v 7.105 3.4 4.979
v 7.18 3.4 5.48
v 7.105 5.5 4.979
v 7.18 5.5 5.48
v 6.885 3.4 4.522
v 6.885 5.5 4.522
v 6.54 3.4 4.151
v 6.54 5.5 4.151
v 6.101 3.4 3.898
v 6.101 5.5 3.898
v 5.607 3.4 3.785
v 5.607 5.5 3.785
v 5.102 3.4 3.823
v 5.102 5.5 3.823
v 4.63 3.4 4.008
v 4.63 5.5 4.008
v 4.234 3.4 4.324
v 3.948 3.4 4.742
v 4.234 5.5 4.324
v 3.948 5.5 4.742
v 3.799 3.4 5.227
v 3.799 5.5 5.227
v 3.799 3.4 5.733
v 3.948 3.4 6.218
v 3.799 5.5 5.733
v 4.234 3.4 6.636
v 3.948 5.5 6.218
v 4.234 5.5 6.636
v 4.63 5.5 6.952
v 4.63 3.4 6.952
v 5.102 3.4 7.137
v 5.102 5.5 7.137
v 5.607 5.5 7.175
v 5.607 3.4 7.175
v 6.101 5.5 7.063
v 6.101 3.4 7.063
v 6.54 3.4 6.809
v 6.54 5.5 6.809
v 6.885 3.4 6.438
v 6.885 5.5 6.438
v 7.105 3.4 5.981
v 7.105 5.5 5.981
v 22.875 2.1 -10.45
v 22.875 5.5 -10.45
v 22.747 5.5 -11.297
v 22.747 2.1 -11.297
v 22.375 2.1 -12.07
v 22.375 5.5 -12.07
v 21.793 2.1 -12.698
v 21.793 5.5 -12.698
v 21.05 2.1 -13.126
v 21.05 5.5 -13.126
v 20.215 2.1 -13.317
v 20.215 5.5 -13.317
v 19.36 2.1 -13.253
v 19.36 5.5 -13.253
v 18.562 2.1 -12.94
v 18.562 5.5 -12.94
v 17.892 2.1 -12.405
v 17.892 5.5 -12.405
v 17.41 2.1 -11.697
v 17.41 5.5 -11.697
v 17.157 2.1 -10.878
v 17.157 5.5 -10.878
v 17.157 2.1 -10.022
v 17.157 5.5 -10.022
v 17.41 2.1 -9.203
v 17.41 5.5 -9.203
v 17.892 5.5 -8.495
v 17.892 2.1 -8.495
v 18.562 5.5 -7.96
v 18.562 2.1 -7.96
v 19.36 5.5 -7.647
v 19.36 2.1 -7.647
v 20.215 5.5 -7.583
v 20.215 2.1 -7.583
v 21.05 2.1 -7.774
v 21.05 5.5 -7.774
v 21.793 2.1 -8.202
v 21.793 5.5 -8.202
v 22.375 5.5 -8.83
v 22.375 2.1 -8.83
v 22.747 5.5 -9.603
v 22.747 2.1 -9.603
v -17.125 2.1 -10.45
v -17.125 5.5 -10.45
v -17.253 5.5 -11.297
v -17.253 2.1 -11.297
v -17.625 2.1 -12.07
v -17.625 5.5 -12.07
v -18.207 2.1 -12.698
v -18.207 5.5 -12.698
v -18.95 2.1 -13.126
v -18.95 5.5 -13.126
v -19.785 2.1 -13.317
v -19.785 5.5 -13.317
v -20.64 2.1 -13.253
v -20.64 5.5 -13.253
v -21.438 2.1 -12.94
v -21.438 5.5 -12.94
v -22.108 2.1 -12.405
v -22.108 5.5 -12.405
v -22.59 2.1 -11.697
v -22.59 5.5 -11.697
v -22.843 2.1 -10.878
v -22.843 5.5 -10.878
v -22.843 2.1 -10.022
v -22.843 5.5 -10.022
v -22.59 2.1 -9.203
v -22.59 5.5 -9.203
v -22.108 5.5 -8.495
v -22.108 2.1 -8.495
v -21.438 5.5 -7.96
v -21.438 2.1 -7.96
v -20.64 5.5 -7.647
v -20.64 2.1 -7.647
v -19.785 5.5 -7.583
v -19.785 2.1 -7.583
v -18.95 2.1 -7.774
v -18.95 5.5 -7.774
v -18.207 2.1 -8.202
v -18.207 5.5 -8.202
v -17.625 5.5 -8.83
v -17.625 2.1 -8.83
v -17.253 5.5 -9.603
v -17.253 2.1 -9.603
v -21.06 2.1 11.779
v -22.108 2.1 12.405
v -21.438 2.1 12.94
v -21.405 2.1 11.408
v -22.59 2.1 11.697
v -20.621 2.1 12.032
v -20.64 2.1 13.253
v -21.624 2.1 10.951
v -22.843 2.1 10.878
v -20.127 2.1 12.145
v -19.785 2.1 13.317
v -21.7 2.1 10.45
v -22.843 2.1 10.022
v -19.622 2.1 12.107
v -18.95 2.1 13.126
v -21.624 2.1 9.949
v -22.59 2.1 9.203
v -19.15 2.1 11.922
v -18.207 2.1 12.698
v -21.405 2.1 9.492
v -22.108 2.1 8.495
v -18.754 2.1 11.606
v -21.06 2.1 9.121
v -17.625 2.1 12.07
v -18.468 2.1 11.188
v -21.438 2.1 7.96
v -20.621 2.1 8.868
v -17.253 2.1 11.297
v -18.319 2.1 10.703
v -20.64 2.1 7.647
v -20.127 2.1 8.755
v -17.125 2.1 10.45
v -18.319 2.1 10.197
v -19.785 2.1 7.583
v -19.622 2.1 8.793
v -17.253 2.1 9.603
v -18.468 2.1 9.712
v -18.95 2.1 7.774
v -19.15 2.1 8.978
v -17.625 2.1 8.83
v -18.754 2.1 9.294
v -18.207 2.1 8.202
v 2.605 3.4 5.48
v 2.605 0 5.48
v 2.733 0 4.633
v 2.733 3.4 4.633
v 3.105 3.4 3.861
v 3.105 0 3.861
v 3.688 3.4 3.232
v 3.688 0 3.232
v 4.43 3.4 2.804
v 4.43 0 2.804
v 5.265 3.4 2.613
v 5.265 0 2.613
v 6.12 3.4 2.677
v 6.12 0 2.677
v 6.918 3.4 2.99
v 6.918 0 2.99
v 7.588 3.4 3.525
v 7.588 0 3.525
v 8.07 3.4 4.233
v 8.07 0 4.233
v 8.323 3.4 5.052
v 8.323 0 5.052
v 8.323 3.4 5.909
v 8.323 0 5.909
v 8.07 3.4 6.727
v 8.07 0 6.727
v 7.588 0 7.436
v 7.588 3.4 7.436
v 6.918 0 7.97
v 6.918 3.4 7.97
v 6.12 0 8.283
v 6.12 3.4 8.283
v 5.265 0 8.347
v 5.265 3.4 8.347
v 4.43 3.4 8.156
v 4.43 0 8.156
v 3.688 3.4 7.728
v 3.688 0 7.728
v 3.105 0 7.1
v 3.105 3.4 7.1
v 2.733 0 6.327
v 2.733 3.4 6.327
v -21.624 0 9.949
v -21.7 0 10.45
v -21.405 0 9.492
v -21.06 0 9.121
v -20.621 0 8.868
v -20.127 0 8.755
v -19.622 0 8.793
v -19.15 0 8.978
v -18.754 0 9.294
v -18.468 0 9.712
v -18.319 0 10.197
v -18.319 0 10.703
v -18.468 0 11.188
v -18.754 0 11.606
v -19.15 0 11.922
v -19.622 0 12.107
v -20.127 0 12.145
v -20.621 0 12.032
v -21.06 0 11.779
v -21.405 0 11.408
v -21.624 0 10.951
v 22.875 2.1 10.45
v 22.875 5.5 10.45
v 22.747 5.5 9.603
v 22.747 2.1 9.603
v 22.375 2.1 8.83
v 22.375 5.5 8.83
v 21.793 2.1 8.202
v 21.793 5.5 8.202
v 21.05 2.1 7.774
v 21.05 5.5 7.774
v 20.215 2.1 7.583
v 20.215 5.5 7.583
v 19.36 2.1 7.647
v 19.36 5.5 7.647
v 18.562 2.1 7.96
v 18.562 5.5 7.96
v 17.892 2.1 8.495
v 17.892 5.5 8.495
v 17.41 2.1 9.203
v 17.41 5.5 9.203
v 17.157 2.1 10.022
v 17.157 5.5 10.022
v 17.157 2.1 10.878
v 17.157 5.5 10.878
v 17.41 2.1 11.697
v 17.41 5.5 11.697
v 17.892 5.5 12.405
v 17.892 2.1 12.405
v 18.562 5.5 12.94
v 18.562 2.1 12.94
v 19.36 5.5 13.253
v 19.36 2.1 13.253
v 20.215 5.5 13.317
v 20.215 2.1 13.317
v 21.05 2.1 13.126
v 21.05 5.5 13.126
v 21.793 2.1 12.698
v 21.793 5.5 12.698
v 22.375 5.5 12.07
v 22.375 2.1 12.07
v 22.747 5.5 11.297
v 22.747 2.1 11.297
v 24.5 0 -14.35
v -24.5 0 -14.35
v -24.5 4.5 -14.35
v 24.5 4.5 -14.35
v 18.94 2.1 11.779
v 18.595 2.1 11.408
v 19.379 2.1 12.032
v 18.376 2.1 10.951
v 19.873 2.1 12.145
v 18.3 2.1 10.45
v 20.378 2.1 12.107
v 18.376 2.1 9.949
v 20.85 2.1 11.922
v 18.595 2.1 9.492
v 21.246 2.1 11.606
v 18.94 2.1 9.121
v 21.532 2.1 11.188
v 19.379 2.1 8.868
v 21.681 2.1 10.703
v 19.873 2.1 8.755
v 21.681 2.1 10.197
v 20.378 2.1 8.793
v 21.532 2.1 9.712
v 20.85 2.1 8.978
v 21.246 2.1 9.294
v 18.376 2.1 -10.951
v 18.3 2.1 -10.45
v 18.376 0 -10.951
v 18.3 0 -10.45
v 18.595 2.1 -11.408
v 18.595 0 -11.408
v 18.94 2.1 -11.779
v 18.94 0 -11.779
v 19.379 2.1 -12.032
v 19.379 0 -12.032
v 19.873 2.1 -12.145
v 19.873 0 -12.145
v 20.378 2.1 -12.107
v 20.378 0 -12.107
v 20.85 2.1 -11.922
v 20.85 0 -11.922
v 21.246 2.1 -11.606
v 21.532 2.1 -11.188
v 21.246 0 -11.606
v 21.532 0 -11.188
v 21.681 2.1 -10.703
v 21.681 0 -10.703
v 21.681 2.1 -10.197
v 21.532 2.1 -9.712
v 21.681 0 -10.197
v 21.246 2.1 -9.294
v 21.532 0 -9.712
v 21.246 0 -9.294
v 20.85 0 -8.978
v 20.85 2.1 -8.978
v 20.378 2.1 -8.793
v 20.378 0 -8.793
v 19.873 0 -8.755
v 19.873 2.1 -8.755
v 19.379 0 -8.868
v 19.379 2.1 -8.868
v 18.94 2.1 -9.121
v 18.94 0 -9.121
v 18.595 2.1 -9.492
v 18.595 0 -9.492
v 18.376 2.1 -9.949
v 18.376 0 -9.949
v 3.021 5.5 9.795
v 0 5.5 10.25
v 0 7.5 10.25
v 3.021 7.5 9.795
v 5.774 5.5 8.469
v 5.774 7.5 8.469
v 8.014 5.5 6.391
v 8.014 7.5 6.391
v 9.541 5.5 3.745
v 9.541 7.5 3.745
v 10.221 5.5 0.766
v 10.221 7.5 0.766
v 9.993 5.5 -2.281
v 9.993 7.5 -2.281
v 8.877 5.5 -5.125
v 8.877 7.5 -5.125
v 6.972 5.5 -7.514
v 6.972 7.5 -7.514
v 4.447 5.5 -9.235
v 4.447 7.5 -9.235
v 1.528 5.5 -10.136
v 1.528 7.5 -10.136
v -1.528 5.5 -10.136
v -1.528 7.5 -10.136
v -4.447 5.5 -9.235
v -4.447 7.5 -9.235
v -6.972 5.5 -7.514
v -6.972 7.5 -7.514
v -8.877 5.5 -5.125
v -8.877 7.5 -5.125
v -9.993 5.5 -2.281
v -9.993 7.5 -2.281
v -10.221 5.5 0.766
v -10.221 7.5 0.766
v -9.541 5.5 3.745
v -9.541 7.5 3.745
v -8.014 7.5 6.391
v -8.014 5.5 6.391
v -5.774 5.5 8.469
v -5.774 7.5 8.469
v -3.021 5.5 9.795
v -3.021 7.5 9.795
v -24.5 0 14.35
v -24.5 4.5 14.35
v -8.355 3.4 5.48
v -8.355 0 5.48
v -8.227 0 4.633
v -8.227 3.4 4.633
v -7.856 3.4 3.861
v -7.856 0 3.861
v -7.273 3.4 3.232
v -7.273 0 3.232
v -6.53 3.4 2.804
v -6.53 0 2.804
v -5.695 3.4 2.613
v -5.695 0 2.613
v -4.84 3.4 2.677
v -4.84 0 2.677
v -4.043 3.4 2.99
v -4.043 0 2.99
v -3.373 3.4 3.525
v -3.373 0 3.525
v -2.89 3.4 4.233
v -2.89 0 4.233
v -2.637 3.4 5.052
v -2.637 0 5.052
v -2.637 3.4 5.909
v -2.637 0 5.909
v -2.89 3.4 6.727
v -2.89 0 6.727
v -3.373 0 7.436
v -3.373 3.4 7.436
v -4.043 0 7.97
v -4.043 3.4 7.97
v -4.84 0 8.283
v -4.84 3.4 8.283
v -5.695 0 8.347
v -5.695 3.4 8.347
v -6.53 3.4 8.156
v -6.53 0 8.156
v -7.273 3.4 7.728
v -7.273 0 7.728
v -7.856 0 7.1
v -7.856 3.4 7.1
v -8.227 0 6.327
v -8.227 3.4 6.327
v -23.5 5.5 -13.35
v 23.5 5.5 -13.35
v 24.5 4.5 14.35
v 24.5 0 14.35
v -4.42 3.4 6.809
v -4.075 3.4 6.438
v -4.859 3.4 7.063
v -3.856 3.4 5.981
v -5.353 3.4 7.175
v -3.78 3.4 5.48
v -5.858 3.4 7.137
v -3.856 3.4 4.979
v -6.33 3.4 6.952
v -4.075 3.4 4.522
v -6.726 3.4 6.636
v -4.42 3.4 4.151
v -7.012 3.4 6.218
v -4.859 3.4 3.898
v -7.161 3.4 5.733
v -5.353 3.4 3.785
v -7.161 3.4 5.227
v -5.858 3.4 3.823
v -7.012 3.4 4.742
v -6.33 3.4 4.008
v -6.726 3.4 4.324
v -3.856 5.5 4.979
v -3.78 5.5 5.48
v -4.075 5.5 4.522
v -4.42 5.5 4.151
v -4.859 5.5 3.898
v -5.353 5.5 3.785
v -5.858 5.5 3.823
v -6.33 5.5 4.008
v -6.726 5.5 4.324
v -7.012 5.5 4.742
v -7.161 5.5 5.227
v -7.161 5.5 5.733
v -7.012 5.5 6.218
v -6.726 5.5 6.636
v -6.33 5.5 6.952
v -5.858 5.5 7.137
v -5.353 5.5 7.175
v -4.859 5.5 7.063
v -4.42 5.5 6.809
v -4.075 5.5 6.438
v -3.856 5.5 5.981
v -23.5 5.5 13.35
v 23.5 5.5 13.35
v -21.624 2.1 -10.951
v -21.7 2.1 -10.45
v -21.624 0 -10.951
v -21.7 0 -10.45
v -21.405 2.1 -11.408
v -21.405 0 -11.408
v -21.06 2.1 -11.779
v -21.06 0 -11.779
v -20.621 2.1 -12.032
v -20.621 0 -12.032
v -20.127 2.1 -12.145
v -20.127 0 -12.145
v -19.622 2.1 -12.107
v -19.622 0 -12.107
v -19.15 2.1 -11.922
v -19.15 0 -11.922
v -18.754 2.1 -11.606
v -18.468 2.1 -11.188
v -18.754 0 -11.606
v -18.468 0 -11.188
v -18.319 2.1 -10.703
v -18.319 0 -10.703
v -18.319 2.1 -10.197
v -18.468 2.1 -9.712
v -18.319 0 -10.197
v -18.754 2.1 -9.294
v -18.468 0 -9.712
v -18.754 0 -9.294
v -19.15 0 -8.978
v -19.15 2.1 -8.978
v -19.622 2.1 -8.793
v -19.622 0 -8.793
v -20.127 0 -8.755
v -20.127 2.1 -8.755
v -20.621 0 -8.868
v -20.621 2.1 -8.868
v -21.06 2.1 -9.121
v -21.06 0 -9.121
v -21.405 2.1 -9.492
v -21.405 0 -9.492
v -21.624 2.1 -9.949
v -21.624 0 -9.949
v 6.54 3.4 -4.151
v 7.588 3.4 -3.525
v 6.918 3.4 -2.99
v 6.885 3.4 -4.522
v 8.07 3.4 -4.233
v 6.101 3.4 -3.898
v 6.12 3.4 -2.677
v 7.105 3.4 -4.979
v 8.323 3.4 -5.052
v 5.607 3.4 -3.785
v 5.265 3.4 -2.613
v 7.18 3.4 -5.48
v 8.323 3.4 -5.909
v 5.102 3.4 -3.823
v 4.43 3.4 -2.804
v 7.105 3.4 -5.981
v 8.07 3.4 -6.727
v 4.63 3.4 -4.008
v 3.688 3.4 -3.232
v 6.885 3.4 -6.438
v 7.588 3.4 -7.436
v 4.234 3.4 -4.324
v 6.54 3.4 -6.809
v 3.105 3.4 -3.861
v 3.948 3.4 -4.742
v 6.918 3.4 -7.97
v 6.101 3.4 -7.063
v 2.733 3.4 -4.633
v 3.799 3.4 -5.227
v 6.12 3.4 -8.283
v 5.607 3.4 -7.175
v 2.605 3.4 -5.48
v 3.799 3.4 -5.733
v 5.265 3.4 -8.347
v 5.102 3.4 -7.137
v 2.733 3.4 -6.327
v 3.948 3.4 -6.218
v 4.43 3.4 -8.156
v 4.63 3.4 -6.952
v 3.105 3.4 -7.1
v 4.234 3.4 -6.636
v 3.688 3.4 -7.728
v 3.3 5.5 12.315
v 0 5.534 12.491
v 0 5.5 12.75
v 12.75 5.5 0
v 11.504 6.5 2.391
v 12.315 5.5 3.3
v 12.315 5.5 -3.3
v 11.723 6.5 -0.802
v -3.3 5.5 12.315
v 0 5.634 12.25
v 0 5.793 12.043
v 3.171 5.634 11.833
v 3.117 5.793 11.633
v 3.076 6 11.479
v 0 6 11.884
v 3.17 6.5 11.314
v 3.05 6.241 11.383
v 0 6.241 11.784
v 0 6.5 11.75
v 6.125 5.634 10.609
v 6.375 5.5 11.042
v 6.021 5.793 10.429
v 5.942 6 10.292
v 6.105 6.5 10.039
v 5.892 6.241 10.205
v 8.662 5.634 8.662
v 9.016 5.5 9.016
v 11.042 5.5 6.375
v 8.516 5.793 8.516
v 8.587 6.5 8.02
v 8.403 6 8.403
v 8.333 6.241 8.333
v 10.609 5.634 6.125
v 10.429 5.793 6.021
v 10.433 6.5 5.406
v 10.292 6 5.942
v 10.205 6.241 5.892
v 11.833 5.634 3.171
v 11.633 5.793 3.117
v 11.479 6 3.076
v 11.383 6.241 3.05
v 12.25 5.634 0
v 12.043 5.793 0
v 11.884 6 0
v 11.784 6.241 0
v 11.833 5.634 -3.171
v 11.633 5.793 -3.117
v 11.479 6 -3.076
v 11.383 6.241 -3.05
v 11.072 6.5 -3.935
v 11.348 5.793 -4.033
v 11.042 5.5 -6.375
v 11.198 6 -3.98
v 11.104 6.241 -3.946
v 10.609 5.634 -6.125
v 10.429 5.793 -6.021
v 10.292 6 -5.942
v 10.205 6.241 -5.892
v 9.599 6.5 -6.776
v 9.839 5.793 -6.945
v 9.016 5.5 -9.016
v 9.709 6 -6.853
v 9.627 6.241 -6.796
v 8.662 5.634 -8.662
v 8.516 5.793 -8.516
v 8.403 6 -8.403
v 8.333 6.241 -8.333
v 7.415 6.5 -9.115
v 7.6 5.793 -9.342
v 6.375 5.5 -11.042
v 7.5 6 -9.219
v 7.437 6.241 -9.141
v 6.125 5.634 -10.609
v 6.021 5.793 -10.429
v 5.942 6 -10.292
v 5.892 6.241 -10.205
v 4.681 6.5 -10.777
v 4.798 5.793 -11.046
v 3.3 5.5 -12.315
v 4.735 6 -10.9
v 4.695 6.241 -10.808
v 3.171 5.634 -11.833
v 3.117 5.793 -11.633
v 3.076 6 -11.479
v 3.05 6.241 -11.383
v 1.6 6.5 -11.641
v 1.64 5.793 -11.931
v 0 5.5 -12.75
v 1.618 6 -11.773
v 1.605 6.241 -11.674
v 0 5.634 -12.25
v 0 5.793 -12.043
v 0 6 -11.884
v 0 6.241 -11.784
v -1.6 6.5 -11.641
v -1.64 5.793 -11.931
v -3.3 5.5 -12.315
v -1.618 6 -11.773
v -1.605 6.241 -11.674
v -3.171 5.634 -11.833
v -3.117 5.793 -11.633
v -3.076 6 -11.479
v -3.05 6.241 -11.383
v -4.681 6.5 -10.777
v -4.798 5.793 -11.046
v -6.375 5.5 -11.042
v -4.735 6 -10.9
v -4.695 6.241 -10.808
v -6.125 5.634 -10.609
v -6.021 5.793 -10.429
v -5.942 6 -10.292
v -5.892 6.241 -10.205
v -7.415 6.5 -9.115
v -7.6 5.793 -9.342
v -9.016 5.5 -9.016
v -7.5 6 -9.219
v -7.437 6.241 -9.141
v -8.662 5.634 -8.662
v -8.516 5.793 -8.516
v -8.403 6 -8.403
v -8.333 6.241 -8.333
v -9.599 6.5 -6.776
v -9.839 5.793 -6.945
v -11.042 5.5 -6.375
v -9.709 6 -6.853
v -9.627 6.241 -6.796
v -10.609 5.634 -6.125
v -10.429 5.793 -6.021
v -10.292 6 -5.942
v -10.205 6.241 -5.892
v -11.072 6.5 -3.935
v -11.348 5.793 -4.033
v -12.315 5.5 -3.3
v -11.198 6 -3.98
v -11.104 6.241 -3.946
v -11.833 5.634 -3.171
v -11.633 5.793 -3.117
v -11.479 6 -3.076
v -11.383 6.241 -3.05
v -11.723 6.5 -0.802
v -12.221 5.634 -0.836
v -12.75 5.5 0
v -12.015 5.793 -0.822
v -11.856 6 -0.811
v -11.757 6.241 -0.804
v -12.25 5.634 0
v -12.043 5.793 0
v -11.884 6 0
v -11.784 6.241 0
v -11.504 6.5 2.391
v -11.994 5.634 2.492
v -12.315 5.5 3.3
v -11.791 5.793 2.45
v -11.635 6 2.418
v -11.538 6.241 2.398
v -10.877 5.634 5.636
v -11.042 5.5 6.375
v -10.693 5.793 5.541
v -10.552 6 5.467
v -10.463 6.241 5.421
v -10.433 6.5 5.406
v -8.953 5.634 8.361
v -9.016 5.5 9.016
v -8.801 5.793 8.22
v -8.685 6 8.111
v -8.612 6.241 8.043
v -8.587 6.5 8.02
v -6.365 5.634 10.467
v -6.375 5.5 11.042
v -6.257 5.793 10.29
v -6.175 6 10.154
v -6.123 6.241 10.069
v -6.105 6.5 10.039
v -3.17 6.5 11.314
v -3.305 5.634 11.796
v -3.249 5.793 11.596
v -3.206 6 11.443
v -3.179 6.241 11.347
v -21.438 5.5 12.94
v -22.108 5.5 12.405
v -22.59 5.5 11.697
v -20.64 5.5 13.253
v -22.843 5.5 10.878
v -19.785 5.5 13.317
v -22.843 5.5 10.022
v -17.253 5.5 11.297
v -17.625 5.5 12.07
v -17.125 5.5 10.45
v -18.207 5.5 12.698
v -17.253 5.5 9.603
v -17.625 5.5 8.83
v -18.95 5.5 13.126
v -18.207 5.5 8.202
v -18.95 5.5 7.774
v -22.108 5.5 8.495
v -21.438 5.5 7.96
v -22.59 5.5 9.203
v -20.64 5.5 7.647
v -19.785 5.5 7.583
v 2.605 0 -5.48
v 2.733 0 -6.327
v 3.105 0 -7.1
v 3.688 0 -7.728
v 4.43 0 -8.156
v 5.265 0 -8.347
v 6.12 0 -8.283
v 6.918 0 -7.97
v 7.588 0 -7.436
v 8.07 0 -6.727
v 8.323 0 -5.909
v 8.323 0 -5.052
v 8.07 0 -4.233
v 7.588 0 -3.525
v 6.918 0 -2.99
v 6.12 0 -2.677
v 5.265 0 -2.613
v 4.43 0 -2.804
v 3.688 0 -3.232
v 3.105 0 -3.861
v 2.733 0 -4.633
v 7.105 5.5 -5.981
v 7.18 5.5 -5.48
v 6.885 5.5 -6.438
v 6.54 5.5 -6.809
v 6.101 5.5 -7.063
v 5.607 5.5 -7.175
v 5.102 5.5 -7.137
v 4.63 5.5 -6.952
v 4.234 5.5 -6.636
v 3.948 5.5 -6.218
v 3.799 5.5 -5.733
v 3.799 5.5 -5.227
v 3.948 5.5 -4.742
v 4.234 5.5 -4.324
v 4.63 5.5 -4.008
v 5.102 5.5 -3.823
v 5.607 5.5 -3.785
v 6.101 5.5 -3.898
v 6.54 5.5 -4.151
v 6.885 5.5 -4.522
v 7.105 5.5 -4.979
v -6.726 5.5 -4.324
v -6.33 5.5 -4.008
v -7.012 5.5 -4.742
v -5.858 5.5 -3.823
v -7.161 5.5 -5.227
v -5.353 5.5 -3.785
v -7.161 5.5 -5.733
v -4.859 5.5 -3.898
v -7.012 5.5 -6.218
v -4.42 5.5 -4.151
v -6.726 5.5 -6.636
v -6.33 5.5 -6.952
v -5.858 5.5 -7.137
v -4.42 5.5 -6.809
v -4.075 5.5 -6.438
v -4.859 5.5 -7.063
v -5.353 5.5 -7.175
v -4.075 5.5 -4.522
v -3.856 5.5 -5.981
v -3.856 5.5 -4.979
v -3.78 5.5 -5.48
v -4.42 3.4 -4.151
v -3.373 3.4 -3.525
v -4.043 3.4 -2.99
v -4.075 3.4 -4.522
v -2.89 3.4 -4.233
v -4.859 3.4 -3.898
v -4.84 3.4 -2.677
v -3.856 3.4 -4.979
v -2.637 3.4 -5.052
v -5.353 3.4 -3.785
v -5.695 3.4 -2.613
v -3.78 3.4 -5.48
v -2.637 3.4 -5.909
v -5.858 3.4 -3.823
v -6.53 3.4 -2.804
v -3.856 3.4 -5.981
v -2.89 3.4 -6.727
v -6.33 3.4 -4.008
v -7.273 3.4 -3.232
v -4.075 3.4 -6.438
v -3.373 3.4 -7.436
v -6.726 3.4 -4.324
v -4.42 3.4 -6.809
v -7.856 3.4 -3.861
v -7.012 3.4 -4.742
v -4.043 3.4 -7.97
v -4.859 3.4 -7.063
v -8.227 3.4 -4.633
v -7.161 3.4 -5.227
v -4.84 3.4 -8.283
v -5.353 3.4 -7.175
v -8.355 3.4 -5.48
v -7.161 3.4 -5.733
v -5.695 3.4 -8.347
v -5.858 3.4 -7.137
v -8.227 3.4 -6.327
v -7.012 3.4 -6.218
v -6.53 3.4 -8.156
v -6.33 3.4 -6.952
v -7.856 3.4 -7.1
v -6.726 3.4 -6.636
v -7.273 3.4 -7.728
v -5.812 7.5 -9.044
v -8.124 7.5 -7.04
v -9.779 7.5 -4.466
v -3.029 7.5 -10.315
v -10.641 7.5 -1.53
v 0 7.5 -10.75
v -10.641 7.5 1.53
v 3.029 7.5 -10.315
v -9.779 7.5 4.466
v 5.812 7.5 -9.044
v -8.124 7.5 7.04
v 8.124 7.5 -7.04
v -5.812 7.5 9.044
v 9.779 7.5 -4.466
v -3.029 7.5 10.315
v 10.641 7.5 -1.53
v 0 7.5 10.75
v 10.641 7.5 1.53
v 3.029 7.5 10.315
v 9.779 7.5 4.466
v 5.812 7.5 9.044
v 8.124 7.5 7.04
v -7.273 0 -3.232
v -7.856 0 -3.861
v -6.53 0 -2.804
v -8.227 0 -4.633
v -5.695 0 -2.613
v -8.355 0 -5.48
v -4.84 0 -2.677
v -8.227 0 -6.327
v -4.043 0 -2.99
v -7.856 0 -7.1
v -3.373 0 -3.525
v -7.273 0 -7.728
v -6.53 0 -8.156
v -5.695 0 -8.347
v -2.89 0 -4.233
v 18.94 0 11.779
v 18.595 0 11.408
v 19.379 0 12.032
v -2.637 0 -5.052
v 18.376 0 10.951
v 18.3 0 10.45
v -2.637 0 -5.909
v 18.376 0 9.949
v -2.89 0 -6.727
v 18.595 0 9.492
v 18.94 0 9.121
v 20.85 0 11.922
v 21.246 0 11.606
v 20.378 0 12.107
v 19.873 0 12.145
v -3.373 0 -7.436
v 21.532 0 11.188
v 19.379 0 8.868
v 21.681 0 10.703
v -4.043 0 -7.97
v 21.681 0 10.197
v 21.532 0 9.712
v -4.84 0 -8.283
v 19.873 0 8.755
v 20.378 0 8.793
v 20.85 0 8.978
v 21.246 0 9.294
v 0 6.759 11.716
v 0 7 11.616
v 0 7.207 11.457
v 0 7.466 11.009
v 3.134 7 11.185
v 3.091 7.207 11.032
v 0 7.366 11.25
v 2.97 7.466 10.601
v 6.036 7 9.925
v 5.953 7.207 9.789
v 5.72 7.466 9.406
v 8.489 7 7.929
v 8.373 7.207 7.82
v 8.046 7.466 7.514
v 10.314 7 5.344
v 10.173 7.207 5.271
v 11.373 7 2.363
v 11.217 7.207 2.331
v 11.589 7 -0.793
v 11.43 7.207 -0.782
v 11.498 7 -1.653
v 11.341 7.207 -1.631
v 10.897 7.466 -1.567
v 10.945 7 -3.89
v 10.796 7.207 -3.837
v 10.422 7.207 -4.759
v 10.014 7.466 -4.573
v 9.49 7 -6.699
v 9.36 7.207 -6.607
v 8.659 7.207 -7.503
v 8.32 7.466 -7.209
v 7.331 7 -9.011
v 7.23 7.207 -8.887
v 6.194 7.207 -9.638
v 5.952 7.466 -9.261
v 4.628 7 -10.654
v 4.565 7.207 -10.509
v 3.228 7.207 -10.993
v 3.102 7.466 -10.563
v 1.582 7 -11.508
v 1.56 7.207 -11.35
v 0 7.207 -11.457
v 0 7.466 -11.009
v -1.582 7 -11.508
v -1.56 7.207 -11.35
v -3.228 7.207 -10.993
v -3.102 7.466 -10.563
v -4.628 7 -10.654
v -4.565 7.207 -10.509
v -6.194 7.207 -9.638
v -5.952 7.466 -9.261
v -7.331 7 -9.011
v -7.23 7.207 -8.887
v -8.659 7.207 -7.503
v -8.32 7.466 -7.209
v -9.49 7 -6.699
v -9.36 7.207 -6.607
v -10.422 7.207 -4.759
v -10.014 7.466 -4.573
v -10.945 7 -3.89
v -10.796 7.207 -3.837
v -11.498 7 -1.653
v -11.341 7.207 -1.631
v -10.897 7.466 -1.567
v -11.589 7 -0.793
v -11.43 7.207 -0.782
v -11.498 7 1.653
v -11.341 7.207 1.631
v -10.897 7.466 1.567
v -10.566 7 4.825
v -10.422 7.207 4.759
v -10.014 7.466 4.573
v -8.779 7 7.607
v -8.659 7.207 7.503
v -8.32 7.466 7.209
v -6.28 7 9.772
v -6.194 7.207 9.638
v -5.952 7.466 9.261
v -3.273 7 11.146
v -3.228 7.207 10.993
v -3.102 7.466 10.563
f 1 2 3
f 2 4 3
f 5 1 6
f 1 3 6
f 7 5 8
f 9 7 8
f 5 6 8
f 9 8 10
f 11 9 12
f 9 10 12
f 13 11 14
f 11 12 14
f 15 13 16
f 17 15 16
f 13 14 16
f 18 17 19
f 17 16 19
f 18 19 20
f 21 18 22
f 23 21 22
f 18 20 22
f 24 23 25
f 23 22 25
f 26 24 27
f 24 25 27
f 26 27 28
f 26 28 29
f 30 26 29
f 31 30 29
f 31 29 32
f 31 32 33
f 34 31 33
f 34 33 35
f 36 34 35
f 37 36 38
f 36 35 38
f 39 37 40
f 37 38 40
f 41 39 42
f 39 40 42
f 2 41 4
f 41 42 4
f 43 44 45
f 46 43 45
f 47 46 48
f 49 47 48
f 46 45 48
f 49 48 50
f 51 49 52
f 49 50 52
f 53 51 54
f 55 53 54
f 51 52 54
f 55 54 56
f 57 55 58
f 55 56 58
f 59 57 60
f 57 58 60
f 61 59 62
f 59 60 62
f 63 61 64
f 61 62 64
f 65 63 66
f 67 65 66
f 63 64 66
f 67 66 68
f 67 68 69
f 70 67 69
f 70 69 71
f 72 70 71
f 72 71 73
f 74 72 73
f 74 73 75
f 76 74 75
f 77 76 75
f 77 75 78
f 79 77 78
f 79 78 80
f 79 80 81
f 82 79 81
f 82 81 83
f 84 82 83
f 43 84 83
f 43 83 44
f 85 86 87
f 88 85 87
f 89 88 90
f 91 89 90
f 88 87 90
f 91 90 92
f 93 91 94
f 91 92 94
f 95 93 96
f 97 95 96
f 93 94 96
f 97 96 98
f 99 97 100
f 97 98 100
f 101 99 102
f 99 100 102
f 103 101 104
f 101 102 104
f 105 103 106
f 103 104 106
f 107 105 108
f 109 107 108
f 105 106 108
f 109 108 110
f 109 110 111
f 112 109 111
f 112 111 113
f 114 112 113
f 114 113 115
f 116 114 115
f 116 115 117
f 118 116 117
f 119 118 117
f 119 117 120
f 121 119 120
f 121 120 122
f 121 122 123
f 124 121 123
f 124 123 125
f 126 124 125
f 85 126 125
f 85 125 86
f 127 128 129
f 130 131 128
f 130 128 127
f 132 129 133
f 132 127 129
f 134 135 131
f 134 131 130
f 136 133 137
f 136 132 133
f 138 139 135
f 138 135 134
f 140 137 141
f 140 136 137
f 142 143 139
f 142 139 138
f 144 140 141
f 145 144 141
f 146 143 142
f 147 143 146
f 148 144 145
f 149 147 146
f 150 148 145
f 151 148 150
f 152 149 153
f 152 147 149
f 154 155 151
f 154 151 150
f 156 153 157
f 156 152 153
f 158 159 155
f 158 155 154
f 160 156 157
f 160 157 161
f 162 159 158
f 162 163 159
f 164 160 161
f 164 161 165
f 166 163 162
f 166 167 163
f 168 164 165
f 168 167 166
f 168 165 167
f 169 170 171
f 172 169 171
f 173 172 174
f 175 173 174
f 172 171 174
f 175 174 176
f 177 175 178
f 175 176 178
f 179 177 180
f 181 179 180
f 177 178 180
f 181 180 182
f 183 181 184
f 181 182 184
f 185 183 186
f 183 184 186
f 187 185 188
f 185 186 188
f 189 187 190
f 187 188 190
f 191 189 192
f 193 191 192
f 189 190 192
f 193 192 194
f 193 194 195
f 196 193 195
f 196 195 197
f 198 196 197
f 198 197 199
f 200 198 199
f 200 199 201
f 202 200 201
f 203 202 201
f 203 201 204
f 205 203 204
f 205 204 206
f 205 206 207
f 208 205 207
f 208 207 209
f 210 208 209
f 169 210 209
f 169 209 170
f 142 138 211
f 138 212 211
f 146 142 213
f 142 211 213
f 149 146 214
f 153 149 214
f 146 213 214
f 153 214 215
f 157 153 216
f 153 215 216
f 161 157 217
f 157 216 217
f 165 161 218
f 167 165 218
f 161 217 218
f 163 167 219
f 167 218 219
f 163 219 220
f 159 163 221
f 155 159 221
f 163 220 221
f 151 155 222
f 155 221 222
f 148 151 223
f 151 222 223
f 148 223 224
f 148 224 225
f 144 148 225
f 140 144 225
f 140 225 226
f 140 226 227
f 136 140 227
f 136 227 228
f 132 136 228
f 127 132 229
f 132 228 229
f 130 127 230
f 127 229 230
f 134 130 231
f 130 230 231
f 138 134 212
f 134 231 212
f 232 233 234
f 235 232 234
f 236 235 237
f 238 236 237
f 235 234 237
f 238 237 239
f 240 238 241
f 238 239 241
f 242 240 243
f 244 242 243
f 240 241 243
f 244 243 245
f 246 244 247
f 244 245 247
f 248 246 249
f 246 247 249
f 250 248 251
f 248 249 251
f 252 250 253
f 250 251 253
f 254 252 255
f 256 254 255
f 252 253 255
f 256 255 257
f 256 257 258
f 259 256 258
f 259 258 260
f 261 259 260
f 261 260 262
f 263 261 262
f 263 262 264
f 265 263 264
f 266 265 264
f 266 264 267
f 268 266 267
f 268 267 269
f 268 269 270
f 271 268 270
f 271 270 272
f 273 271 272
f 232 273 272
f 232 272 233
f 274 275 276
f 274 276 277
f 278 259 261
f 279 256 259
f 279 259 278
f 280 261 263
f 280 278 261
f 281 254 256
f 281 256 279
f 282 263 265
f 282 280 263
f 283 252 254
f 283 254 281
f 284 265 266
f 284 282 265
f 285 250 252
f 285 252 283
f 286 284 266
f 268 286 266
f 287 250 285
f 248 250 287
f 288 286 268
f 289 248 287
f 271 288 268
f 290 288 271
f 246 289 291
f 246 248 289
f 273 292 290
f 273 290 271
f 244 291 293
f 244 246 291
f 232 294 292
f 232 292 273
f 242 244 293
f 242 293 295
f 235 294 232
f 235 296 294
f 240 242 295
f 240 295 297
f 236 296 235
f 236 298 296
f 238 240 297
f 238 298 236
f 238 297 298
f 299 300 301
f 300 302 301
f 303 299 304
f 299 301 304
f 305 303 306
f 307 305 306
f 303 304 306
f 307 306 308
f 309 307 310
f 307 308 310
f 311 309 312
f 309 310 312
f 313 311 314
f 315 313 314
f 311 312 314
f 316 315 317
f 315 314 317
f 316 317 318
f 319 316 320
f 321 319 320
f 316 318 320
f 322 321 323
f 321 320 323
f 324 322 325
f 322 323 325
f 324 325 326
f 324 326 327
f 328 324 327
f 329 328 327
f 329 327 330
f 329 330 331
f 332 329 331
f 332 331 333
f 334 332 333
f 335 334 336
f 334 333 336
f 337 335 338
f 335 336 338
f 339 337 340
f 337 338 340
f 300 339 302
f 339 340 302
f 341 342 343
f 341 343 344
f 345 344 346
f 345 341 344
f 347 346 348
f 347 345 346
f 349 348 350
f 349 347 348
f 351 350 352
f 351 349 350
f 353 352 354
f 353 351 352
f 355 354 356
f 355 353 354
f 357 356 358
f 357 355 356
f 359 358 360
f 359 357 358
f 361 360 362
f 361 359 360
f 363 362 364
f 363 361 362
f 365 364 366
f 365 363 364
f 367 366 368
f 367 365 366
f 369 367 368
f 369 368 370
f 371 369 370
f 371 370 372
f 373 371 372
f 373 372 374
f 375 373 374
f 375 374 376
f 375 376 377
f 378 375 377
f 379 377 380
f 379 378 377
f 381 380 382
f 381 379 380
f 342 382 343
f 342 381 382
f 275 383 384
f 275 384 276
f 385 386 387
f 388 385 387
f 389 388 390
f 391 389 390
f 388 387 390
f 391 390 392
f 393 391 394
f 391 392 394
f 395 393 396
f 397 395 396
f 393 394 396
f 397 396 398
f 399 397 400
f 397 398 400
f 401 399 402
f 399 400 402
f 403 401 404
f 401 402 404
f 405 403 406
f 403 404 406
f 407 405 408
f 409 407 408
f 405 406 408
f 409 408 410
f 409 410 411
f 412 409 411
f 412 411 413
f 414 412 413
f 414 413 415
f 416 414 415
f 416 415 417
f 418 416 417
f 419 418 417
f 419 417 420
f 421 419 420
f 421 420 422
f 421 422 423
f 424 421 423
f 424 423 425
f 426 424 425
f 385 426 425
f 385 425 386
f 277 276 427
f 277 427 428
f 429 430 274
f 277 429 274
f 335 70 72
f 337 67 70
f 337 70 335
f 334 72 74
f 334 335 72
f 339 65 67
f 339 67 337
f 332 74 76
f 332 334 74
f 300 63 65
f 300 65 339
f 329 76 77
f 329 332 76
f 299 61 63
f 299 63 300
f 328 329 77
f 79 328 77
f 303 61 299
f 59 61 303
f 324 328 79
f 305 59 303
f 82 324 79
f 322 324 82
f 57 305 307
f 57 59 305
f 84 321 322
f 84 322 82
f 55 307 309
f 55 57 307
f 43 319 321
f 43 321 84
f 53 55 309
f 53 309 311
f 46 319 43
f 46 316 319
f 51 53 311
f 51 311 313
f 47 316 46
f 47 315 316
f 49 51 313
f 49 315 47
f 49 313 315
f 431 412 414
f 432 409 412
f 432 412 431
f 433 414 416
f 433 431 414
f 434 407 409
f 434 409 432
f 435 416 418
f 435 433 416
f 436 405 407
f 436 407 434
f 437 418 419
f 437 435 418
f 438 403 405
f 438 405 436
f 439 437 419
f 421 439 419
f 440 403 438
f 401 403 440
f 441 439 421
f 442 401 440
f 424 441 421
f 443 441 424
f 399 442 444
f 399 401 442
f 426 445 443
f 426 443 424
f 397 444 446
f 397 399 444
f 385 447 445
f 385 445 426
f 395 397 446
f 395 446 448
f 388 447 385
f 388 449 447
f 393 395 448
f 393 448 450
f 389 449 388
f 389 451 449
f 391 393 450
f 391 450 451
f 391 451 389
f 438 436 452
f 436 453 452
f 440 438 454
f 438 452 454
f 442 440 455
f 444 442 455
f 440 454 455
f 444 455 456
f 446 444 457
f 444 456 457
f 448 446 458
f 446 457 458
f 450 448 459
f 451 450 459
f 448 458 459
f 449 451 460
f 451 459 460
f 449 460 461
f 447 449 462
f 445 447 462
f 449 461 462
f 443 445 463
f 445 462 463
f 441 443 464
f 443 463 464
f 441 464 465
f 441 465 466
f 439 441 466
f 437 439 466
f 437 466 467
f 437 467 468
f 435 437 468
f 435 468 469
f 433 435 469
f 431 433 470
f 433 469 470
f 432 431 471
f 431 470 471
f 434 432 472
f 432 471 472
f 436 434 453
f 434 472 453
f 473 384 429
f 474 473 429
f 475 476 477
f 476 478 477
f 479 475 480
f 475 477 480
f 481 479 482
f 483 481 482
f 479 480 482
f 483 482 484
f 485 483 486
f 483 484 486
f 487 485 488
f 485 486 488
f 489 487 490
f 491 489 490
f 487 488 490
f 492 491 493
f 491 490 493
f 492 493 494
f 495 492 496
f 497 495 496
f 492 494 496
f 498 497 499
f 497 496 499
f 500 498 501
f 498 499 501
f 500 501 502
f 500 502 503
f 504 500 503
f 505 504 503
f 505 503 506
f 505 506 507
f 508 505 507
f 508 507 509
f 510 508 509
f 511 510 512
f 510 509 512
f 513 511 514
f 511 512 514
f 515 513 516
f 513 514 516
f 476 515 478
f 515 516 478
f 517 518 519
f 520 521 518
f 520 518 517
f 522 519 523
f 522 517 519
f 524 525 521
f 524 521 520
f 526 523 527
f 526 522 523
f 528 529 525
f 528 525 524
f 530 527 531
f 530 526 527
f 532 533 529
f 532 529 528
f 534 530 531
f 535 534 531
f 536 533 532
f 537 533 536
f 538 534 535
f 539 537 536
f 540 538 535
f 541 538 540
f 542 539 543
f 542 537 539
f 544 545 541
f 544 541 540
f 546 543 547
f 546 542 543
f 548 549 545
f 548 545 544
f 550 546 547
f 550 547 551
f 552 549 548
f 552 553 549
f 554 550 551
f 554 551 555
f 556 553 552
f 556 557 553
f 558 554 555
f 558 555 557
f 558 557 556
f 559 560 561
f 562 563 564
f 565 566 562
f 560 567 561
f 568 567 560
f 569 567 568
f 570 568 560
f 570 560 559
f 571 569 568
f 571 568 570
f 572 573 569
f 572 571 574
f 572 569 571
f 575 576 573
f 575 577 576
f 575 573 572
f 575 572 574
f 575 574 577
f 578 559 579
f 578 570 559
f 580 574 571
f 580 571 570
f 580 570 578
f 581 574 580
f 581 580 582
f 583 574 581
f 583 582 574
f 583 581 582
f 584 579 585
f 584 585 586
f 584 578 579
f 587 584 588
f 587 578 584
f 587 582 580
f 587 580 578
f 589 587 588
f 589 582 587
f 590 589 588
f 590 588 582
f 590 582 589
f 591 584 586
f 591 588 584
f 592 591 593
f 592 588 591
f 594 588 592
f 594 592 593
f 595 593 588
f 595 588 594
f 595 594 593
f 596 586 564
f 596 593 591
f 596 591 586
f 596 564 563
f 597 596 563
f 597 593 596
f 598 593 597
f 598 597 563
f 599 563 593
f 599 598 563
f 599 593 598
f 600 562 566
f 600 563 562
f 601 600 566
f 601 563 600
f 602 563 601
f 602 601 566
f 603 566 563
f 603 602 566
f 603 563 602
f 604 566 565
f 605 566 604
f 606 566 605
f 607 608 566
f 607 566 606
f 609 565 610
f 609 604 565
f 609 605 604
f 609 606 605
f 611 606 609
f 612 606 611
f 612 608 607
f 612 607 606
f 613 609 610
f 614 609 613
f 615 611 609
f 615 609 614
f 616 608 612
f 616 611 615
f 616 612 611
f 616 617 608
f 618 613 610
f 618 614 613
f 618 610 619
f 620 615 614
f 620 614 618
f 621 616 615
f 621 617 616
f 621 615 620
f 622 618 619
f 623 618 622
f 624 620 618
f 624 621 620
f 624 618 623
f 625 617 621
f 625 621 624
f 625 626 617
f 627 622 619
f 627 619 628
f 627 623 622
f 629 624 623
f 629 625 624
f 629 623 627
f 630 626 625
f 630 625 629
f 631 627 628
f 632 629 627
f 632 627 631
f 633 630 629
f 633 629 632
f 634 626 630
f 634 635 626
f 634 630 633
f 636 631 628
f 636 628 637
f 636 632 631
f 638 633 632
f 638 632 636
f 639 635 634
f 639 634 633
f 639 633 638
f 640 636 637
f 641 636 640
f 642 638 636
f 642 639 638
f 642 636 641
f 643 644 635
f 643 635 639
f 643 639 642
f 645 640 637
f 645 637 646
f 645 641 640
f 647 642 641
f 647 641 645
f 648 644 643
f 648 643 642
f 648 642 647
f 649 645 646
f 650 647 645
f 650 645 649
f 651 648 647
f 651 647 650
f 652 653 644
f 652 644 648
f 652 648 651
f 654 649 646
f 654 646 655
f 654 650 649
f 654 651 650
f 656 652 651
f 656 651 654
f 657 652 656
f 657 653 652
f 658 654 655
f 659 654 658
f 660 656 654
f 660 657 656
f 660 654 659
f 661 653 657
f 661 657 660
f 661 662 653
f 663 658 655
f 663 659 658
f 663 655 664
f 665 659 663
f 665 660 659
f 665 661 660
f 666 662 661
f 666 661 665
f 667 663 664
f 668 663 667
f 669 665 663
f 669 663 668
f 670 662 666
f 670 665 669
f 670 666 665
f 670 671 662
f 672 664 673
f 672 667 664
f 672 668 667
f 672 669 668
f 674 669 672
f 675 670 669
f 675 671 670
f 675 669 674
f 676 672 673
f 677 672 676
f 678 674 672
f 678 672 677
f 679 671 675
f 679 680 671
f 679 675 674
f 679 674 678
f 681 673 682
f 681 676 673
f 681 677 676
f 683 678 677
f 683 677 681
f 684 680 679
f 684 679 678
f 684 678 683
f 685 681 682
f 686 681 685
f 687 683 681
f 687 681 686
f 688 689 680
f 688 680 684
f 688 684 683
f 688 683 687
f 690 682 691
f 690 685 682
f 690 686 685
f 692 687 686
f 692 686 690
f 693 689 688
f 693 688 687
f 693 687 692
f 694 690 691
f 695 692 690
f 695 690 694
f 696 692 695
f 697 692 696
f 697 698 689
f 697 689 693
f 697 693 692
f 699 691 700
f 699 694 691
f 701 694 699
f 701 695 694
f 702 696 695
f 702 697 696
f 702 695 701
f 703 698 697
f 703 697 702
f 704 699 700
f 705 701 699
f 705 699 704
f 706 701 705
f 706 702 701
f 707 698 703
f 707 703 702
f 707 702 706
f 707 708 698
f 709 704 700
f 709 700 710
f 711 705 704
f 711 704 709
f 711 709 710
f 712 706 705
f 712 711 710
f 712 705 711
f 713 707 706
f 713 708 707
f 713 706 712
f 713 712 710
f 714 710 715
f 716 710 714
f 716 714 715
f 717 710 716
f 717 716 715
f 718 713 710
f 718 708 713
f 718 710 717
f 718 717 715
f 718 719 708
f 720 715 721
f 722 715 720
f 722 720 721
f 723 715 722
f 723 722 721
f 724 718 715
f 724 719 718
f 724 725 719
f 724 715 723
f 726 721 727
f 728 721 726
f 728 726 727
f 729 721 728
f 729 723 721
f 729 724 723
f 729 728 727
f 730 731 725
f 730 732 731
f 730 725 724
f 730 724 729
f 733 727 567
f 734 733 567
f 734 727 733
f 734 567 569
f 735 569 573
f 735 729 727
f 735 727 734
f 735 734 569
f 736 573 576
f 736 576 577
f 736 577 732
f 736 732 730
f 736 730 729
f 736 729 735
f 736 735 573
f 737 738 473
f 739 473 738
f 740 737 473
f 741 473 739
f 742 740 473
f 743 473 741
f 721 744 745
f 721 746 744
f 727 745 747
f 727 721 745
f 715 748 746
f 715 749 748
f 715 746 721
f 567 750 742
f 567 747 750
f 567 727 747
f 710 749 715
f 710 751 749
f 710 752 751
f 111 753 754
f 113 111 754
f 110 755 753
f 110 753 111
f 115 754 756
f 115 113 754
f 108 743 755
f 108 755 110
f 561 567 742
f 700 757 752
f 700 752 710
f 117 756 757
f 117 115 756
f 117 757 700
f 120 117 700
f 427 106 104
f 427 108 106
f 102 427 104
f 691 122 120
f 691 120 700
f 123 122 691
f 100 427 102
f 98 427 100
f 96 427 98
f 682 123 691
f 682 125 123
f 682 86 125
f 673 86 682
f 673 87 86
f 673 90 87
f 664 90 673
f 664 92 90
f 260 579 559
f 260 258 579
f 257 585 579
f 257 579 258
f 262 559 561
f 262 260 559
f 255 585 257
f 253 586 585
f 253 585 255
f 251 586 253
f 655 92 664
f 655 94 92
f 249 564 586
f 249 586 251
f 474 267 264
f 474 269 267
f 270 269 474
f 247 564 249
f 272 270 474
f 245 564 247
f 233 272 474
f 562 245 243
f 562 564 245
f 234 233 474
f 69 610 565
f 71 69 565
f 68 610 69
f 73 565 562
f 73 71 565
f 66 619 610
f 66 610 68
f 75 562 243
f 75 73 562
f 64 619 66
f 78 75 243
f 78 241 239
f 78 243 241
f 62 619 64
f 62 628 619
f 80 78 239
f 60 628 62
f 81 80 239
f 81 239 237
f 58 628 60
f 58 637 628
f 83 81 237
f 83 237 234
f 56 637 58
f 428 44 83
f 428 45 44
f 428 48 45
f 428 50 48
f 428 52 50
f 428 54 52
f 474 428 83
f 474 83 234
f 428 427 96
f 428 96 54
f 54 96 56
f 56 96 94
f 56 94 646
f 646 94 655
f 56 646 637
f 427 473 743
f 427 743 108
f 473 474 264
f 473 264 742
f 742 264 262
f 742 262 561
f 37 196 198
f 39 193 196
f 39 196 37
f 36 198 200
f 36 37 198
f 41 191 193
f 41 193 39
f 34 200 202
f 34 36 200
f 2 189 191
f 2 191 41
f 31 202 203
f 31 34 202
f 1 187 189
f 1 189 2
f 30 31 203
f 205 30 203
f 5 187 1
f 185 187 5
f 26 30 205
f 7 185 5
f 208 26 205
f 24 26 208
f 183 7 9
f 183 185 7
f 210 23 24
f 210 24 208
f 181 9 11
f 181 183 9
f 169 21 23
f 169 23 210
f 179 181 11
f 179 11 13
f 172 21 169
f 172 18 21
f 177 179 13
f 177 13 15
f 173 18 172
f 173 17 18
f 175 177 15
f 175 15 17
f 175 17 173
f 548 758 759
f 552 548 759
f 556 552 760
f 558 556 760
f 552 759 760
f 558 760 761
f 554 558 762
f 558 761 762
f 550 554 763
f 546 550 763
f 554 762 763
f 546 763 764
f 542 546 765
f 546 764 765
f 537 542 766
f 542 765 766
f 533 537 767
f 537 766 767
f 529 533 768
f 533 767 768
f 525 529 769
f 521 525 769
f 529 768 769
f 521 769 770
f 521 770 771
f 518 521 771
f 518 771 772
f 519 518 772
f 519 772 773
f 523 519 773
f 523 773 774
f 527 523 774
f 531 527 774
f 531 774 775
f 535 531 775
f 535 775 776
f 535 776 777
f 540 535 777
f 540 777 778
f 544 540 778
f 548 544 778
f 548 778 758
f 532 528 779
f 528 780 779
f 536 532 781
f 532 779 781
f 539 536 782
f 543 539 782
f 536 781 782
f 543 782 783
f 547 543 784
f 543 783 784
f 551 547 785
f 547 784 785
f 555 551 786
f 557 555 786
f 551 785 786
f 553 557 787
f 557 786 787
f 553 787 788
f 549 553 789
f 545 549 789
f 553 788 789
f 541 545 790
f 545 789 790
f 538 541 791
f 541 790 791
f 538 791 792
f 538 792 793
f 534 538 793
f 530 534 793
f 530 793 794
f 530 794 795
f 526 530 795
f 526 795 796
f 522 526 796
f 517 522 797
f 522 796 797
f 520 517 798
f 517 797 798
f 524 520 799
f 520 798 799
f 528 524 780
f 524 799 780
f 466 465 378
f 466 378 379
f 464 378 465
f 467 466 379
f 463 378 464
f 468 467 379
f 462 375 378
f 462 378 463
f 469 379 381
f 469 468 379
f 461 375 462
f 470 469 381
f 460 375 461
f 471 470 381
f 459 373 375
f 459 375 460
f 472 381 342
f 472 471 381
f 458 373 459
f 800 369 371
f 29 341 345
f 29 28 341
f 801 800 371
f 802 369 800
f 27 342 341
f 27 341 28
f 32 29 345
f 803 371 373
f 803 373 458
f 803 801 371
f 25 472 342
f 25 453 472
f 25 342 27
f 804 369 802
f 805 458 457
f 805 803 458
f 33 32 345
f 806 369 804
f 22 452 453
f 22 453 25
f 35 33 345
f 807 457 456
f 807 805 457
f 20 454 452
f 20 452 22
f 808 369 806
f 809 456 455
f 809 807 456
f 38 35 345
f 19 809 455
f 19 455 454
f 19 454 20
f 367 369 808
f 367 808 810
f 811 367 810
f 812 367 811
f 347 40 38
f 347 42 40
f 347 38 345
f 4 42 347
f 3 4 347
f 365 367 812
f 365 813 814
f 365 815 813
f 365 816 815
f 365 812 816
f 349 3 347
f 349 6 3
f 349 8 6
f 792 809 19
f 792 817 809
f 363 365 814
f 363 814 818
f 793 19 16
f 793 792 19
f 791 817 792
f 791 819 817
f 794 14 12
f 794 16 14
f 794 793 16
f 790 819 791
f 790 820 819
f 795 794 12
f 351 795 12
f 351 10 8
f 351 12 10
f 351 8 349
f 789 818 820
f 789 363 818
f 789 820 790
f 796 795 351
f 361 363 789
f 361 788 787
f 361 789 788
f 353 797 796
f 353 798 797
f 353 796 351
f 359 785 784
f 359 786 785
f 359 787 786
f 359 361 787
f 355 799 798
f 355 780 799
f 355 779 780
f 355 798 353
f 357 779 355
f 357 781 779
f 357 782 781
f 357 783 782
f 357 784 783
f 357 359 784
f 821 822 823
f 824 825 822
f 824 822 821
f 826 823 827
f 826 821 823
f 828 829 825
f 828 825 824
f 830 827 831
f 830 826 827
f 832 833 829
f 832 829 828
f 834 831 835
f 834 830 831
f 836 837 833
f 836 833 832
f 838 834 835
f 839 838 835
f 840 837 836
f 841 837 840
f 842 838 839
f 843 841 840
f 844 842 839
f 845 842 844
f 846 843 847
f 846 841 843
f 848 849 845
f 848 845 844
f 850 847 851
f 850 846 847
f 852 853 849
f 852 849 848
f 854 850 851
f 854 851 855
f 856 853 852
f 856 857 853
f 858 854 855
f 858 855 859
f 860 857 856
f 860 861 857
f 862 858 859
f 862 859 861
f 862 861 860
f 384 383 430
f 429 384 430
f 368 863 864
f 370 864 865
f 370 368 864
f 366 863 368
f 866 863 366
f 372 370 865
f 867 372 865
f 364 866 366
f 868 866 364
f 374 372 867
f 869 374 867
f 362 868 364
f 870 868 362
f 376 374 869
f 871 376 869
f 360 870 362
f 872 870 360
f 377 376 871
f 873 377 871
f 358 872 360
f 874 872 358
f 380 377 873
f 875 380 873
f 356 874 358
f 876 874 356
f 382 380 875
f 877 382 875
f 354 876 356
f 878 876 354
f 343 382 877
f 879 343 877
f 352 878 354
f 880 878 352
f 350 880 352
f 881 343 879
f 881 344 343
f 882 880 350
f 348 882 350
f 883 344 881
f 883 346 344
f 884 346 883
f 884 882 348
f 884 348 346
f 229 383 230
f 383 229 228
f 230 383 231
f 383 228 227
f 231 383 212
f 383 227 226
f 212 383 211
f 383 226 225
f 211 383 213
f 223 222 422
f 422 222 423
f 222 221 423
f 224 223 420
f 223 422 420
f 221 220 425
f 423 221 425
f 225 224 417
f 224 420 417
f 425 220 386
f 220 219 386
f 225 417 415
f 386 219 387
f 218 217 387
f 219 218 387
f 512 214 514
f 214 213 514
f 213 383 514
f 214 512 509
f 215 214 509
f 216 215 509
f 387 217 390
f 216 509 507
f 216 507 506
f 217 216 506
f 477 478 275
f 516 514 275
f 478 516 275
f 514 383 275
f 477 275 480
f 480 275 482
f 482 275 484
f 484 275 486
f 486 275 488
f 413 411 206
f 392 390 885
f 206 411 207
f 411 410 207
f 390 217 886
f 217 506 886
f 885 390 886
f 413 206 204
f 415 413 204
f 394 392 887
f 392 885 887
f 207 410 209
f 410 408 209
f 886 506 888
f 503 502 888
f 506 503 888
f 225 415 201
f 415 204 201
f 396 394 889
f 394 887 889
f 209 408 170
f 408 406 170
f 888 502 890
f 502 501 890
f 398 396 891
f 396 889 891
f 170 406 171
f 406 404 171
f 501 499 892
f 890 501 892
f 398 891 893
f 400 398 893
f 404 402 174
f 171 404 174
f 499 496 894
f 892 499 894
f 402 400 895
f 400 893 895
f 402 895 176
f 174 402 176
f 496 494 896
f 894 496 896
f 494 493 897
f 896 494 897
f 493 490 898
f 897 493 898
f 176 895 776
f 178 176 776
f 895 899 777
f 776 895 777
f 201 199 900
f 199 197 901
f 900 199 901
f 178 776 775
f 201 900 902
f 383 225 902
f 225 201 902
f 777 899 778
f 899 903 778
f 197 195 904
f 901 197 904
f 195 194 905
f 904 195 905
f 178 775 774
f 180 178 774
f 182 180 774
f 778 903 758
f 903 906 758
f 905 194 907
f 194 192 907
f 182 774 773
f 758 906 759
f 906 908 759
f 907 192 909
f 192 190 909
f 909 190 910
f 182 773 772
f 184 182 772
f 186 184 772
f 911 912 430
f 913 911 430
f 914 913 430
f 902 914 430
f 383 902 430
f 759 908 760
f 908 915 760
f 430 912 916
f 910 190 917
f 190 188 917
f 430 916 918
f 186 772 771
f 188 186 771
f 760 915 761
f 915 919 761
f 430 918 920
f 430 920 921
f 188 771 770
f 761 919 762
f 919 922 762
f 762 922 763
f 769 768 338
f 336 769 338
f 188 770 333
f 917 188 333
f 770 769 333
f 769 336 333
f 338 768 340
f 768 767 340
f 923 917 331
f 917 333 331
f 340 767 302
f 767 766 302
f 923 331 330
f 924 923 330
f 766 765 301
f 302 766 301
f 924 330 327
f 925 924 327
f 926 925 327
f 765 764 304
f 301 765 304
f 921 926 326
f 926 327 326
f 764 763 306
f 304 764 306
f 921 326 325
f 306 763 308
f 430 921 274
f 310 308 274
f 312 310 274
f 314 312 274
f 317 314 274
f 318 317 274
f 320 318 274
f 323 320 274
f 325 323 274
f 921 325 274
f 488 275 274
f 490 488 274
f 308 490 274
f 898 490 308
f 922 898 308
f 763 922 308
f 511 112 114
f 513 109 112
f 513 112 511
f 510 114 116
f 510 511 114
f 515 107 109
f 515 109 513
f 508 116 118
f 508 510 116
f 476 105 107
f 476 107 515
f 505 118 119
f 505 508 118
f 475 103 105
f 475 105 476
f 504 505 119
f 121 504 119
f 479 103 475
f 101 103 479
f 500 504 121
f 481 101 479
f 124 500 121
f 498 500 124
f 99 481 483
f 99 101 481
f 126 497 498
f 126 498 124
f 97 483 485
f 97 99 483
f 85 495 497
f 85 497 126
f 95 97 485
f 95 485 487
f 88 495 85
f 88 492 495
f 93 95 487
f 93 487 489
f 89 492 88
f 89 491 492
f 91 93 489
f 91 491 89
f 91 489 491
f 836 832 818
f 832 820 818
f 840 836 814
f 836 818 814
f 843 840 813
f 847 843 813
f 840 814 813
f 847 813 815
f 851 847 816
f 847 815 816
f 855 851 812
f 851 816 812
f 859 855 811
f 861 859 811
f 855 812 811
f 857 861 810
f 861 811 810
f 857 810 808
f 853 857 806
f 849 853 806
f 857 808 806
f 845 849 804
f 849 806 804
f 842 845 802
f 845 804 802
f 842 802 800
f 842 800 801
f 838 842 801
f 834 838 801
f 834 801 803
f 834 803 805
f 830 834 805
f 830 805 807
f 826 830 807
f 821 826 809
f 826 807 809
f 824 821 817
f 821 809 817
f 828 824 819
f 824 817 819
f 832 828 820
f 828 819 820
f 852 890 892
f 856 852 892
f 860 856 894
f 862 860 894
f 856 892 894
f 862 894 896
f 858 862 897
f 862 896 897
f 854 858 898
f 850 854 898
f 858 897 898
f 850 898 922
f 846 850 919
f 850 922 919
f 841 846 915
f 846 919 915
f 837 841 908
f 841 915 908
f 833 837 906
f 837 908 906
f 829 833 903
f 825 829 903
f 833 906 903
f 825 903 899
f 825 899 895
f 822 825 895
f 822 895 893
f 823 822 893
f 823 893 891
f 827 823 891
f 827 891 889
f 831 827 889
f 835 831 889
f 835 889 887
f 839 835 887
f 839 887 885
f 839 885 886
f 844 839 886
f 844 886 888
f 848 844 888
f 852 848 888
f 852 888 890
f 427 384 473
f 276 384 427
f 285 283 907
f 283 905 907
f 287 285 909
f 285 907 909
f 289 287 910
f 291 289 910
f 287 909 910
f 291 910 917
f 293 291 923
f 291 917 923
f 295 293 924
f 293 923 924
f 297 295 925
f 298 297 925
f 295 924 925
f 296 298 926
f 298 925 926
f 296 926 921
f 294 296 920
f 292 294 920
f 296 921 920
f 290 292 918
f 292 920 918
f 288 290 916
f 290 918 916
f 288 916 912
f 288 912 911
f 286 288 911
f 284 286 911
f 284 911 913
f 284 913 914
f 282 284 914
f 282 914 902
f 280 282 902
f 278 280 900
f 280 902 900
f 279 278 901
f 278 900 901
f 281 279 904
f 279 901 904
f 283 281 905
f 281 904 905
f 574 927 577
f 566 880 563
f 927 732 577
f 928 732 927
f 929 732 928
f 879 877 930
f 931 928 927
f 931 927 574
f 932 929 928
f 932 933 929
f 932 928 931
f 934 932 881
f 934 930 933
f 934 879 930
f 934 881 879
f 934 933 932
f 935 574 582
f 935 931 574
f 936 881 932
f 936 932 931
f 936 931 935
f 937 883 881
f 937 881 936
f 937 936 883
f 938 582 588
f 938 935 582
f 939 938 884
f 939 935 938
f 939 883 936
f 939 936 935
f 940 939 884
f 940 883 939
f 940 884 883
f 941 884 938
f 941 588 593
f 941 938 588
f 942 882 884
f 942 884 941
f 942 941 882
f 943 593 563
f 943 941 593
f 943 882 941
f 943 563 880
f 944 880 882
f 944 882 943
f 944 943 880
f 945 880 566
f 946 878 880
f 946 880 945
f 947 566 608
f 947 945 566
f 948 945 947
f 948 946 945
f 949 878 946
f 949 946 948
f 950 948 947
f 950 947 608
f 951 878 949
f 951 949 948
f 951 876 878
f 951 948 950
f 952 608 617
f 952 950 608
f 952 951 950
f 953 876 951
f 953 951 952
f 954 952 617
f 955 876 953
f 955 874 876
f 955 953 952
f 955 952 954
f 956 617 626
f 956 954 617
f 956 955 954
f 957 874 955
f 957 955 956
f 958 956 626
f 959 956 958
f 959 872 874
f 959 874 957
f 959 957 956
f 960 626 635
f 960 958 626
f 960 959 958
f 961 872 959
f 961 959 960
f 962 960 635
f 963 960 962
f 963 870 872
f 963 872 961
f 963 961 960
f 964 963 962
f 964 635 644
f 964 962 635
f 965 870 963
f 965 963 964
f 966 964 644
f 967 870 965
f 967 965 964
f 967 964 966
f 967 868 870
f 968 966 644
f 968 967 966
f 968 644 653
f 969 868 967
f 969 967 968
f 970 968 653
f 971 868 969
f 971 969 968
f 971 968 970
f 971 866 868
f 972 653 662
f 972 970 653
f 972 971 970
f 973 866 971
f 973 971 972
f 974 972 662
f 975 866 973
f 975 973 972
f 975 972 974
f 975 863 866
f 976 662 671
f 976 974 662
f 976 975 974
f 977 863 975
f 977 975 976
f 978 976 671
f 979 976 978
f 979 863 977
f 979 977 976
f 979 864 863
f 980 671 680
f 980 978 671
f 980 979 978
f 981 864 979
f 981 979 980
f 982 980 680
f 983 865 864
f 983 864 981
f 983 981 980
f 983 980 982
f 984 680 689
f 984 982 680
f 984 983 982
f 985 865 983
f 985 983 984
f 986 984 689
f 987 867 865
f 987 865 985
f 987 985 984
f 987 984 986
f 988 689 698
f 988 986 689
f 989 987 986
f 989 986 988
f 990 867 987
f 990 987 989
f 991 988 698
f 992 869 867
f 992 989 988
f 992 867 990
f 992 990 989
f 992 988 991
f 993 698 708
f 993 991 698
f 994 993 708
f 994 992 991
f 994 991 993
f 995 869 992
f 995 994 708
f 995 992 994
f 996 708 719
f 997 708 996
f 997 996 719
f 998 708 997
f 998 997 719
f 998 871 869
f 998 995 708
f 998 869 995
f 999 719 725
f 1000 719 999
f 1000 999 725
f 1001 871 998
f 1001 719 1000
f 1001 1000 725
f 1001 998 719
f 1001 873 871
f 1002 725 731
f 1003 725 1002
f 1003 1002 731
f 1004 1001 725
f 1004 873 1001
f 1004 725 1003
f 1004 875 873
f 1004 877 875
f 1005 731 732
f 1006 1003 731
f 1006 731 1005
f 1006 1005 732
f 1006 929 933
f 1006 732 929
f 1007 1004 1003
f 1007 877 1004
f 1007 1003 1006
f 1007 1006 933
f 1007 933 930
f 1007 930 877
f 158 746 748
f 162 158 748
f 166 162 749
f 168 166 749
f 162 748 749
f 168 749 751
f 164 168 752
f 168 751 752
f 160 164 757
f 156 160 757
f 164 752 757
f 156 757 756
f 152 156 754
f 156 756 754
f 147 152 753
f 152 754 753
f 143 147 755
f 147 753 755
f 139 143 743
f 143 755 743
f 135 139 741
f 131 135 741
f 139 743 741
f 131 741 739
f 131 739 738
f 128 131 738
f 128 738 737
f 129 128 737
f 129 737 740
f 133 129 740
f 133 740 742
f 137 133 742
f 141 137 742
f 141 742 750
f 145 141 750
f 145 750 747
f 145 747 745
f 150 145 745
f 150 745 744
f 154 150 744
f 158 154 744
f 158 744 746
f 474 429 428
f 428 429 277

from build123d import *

# Parameters (mm, degrees)
SKETCH1_W                      = 49
SKETCH1_H                      = 28.7
BOSS_EXTRUDE1_DEPTH            = 5.5
CBORE_FOR_M3_SHCS1_D           = 3.4
CBORE_FOR_M3_SHCS1_CBORE_D     = 5.75
CBORE_FOR_M3_SHCS1_CBORE_DEPTH = 3.4
CBORE_FOR_M3_SHCS2_D           = 3.4
CBORE_FOR_M3_SHCS2_CBORE_D     = 5.75
CBORE_FOR_M3_SHCS2_CBORE_DEPTH = 3.4
SKETCH9_R                      = 11.75
SKETCH9_R_2                    = 10.25
BOSS_EXTRUDE2_DEPTH            = 2
FILLET1_R                      = 1
CHAMFER1_SIZE                  = 1


with BuildPart() as part:
    # Sketch1 → Boss-Extrude1 (new body)
    with BuildSketch(Plane(origin=(0, 0, 0), x_dir=(1, 0, 0), z_dir=(0, 1, 0))):
        Rectangle(SKETCH1_W, SKETCH1_H)
    extrude(amount=BOSS_EXTRUDE1_DEPTH)

    # CBORE for M3 SHCS1 (through all)
    with Locations(Plane(origin=(0, 5.5, 0), x_dir=(1, 0, 0), z_dir=(0, 1, 0))):
        with Locations((-20, 10.45), (20, 10.45), (20, -10.45), (-20, -10.45)):
            CounterBoreHole(CBORE_FOR_M3_SHCS1_D / 2, CBORE_FOR_M3_SHCS1_CBORE_D / 2, CBORE_FOR_M3_SHCS1_CBORE_DEPTH)

    # CBORE for M3 SHCS2 (through all)
    with Locations(Plane(origin=(0, 0, 0), x_dir=(-1, 0, 0), z_dir=(0, -1, 0))):
        with Locations((-5.480077554, -5.480077554), (5.480077554, -5.480077554), (5.480077554, 5.480077554), (-5.480077554, 5.480077554)):
            CounterBoreHole(CBORE_FOR_M3_SHCS2_D / 2, CBORE_FOR_M3_SHCS2_CBORE_D / 2, CBORE_FOR_M3_SHCS2_CBORE_DEPTH)

    # Sketch9 → Boss-Extrude2 (add)
    with BuildSketch(Plane(origin=(0, 5.5, 0), x_dir=(1, 0, 0), z_dir=(0, 1, 0))):
        with Locations(Location((0, 0, 0), (0, 0, 270))):
            Circle(SKETCH9_R)
        with Locations(Location((0, 0, 0), (0, 0, 270))):
            Circle(SKETCH9_R_2, mode=Mode.SUBTRACT)
    extrude(amount=BOSS_EXTRUDE2_DEPTH)

    # Fillet1
    fillet1_edges = [part.edges().sort_by_distance(p)[0] for p in [
        (0, 5.5, -11.75),
        (0, 7.5, -11.75),
    ]]
    fillet(fillet1_edges, radius=FILLET1_R - 0.0001)  # a hair under: the kernel refuses the full size

    # Chamfer1
    chamfer1_edges = [part.edges().sort_by_distance(p)[0] for p in [
        (24.5, 5.5, 0),
        (0, 5.5, -14.35),
        (-24.5, 5.5, 0),
        (0, 5.5, 14.35),
    ]]
    chamfer(chamfer1_edges, length=CHAMFER1_SIZE)


solid = part.part
